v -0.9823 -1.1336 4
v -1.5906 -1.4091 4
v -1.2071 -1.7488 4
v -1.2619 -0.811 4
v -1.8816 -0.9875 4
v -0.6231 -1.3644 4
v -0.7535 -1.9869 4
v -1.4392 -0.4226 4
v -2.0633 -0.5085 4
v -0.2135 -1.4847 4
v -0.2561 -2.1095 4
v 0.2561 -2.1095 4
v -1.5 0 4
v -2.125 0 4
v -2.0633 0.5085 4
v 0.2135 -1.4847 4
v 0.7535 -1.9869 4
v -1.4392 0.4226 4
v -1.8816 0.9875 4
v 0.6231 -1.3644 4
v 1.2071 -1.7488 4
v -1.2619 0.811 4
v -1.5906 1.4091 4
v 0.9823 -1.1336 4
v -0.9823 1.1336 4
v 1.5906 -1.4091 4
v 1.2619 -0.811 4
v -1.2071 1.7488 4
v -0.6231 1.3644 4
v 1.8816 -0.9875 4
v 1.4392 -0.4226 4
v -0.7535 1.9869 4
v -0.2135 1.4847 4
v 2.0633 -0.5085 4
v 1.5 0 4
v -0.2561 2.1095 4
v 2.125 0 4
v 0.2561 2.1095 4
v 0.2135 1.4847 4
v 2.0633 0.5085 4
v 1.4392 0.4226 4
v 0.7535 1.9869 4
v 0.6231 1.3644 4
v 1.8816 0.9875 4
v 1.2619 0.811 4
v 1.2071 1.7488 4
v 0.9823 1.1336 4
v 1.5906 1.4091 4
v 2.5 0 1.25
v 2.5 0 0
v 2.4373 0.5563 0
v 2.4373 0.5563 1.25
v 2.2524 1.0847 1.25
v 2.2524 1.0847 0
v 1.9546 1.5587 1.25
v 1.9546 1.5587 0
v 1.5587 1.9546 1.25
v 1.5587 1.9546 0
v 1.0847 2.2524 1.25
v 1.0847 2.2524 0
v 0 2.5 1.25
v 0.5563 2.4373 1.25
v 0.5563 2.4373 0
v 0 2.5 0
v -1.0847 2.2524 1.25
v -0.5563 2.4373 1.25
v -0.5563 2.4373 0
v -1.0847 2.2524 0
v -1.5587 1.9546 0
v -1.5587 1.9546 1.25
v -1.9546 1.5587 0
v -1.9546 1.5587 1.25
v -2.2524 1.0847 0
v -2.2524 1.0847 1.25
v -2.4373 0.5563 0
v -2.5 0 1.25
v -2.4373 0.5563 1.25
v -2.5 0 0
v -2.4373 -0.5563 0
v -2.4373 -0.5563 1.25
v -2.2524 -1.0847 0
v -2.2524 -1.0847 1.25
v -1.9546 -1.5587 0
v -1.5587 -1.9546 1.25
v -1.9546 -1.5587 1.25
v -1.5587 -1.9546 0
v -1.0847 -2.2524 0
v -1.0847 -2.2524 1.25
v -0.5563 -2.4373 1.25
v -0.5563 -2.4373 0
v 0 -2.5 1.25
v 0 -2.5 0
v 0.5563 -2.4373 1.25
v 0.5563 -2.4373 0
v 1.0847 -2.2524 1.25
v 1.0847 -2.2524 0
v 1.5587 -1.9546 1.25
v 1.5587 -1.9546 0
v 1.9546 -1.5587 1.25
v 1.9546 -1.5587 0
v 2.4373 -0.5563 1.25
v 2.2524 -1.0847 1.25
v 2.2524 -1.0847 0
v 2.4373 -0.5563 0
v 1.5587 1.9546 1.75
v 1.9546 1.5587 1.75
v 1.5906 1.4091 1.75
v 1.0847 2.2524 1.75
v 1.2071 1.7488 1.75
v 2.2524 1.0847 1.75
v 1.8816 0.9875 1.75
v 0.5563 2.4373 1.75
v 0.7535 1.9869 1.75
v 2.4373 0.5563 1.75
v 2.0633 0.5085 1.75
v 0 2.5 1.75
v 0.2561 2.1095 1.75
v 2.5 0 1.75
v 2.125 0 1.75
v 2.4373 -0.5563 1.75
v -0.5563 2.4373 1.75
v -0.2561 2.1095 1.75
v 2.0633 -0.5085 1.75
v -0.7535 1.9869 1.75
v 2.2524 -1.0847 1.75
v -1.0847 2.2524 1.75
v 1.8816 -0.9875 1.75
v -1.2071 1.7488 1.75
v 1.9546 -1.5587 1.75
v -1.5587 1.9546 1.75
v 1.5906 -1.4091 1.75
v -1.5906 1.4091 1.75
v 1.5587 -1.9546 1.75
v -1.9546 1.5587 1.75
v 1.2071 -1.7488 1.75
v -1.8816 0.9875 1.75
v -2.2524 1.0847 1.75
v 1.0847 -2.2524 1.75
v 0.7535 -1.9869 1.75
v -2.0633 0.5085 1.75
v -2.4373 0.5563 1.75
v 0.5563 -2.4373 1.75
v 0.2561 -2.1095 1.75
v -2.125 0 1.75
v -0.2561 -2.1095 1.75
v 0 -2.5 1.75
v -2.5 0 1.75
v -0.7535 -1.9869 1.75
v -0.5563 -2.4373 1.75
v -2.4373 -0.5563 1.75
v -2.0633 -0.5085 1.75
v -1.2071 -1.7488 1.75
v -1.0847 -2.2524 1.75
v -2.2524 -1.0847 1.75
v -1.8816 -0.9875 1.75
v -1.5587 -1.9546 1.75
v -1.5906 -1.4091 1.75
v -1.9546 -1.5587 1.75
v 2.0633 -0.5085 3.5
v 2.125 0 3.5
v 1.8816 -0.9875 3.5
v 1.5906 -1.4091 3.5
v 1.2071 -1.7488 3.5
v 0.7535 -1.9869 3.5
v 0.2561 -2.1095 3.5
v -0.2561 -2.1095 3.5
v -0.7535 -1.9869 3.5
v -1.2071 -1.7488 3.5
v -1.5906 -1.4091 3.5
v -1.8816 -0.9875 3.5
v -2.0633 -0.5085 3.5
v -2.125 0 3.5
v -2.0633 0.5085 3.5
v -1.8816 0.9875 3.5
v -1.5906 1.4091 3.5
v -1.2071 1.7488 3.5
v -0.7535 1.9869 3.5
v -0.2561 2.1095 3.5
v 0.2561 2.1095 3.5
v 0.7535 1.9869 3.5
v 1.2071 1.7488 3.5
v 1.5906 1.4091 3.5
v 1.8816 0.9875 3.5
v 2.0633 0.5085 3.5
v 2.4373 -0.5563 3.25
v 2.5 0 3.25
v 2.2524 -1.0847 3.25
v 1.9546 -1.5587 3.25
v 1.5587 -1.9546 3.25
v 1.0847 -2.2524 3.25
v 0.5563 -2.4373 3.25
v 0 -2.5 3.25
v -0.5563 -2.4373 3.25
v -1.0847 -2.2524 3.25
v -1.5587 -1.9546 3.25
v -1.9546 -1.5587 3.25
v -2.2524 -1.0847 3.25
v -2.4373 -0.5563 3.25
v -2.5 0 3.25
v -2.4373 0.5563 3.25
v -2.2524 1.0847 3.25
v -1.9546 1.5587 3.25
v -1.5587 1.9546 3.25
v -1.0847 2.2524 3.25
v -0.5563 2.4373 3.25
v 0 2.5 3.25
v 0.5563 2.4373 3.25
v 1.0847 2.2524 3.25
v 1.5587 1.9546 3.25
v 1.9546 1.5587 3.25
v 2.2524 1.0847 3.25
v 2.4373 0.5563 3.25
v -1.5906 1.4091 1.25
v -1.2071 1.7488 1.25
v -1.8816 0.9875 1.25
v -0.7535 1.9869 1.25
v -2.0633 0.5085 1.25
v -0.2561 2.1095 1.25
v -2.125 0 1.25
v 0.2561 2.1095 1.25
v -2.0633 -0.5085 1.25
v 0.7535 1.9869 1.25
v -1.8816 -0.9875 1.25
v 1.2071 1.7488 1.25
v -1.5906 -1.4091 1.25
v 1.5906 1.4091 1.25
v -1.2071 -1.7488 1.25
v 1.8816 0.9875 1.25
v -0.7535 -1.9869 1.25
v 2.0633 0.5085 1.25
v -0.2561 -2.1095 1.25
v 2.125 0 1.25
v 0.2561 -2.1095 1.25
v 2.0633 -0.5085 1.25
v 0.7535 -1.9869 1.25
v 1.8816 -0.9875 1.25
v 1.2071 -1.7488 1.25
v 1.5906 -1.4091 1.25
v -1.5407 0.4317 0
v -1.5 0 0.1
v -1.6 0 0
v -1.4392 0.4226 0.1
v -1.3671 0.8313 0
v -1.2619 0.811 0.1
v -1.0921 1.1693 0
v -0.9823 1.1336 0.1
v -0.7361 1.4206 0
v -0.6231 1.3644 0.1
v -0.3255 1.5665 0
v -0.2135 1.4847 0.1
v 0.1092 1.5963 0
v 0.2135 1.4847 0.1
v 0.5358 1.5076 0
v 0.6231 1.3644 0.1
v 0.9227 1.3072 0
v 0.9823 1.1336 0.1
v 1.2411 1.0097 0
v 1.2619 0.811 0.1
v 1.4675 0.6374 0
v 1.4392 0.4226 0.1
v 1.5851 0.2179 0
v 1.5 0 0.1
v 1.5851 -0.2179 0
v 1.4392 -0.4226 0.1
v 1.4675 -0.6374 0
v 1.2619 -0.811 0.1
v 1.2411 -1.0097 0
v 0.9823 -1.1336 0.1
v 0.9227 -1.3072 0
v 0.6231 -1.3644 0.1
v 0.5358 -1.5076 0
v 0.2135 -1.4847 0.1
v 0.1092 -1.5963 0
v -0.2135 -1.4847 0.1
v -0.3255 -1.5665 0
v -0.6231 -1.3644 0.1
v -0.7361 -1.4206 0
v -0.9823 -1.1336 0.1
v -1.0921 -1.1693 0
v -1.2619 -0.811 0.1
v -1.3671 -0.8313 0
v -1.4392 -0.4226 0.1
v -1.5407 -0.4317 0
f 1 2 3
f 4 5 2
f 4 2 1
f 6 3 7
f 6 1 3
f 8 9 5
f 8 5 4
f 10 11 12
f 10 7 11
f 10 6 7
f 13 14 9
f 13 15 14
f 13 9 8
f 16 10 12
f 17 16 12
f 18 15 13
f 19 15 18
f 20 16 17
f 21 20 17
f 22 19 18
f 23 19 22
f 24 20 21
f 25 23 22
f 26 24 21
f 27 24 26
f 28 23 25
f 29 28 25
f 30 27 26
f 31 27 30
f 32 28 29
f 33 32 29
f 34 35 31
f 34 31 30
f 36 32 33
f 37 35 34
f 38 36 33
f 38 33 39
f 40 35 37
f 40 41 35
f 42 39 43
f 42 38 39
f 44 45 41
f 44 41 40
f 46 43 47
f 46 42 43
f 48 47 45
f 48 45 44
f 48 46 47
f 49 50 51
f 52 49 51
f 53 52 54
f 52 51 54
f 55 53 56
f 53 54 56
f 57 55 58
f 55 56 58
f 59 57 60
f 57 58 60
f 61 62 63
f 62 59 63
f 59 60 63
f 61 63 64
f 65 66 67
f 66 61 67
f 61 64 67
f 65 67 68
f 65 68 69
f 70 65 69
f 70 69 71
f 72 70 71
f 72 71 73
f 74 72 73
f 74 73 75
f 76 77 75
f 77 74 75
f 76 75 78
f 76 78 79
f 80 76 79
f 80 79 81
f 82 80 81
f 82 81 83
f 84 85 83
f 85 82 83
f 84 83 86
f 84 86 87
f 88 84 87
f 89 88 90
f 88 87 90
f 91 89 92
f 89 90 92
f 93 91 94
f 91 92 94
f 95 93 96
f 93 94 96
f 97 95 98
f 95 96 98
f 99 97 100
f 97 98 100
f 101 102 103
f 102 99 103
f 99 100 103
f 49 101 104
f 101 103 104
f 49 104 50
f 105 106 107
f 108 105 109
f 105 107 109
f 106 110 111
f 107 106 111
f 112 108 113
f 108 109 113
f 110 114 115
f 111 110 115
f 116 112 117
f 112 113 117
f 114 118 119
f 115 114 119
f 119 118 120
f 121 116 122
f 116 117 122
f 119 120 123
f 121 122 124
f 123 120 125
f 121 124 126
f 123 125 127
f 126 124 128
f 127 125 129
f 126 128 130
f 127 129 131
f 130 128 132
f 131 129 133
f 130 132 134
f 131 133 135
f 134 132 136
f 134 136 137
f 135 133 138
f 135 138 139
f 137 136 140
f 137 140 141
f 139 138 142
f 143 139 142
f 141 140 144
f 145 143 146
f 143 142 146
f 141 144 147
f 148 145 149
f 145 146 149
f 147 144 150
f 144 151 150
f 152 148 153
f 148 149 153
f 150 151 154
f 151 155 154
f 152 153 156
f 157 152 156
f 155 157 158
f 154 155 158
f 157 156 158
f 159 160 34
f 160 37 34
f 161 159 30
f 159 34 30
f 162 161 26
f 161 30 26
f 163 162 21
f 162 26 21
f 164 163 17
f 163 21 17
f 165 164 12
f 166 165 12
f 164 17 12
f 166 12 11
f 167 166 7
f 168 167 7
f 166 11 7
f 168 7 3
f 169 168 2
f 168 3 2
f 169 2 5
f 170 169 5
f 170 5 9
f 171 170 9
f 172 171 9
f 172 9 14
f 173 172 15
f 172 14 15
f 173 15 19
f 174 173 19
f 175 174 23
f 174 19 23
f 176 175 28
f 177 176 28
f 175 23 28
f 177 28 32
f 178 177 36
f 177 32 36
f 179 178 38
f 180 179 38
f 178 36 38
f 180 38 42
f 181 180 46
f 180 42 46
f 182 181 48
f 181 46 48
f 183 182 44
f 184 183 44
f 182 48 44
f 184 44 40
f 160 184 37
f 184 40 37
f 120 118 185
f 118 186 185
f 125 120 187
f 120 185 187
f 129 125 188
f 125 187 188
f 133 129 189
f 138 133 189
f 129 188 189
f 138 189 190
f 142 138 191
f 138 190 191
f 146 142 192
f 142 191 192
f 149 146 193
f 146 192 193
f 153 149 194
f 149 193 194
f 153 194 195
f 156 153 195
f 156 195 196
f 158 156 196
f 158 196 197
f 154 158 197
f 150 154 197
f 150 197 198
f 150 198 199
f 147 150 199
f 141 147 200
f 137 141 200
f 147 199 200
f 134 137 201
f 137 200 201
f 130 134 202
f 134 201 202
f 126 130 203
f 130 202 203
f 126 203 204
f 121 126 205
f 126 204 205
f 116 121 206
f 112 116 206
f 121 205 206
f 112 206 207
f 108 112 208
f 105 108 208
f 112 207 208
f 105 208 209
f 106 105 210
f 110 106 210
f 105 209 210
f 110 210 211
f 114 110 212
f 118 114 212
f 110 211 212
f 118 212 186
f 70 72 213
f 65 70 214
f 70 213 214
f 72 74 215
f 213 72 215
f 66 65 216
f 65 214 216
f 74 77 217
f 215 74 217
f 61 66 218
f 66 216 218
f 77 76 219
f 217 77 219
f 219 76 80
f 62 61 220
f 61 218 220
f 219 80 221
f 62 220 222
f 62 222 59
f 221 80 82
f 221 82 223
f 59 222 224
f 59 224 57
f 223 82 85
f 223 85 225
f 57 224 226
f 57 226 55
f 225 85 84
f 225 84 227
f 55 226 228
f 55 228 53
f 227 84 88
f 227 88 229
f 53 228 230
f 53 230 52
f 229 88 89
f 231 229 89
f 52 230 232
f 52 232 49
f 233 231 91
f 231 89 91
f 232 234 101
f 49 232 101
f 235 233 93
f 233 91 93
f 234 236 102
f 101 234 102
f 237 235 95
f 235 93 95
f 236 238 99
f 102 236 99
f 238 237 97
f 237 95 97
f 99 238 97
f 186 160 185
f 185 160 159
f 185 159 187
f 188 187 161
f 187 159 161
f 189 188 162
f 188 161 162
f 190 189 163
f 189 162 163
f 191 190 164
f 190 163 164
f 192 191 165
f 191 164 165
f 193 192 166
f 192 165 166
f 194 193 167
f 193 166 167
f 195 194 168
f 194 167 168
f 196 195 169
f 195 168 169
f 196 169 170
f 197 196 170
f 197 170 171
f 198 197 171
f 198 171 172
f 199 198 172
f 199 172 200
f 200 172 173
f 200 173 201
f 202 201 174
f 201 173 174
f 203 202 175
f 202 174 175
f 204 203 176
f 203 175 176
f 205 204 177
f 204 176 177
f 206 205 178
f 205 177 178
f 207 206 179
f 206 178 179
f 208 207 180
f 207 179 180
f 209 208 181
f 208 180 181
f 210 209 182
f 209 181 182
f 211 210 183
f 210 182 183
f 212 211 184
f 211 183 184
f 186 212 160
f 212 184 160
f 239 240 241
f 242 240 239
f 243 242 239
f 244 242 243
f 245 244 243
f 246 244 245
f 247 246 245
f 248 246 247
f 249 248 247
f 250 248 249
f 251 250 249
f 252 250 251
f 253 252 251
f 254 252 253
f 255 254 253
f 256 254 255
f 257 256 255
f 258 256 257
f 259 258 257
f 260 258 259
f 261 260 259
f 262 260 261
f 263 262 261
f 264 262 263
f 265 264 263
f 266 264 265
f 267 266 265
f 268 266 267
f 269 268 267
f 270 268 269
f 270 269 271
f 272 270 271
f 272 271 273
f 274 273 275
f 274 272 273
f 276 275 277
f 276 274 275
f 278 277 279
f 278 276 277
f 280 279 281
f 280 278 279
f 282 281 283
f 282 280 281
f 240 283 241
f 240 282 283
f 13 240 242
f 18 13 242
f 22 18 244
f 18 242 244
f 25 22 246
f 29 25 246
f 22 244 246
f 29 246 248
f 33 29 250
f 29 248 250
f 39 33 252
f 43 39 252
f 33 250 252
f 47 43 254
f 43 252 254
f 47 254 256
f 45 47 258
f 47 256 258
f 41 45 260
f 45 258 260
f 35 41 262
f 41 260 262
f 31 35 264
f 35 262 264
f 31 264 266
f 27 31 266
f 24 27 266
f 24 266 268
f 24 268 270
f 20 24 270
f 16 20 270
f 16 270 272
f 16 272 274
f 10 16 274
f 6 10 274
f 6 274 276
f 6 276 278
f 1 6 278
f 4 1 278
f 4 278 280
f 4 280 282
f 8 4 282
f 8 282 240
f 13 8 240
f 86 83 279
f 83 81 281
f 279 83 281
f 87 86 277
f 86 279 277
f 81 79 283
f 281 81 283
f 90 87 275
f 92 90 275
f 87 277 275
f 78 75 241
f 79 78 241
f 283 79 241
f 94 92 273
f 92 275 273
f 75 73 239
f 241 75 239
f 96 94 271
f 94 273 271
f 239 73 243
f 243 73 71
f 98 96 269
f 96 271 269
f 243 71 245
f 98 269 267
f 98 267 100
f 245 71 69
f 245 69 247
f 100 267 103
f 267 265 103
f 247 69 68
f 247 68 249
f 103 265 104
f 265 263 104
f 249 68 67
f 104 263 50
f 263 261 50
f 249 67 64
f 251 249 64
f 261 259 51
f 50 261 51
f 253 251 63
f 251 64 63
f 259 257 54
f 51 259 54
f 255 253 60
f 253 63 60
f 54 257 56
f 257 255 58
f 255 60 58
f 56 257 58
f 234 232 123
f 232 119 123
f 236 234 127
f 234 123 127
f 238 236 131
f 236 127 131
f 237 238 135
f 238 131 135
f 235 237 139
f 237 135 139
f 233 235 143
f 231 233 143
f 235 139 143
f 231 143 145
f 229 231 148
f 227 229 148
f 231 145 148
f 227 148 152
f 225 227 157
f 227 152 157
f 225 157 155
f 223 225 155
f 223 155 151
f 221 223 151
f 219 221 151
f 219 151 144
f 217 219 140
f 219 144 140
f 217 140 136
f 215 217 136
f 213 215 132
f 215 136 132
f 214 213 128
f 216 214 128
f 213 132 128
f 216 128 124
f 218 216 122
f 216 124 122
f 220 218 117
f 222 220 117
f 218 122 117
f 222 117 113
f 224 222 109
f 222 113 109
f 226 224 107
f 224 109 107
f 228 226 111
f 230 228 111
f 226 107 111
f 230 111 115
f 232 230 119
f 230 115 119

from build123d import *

# Parameters (mm, degrees)
SKETCH1_R           = 2.5
BOSS_EXTRUDE1_DEPTH = 4
SKETCH3_R           = 1.5
CUT_EXTRUDE1_DEPTH  = 5
CHAMFER1_SIZE       = 0.1


with BuildPart() as part:
    # Sketch1 → Boss-Extrude1 (new body)
    with BuildSketch(Plane.XY):
        Circle(SKETCH1_R)
    extrude(amount=BOSS_EXTRUDE1_DEPTH)

    # Sketch2 → Cut-Revolve1 (revolve, cut)
    with BuildSketch(Plane(origin=(0, 0, 0), x_dir=(1, 0, 0), z_dir=(0, 1, 0)), mode=Mode.PRIVATE) as cut_revolve1_sk:
        Polygon((-2.125, -4), (-3, -4), (-3, 0), (-2.5, 0), (-2.5, -1.25), (-2.125, -1.25), (-2.125, -1.75), (-2.5, -1.75), (-2.5, -3.25), (-2.125, -3.5), align=None)
    revolve(cut_revolve1_sk.sketch.rotate(Axis((0, 0, 4), (0, 0, -1)), 180), axis=Axis((0, 0, 4), (0, 0, -1)), mode=Mode.SUBTRACT)

    # Sketch3 → Cut-Extrude1 (cut)
    with BuildSketch(Plane(origin=(0, 0, 0), x_dir=(-1, 0, 0), z_dir=(0, 0, -1))):
        Circle(SKETCH3_R)
    extrude(amount=-CUT_EXTRUDE1_DEPTH, mode=Mode.SUBTRACT)

    # Chamfer1
    chamfer1_edges = [part.edges().sort_by_distance(p)[0] for p in [
        (1.5, 0, 0),
    ]]
    chamfer(chamfer1_edges, length=CHAMFER1_SIZE)


solid = part.part
